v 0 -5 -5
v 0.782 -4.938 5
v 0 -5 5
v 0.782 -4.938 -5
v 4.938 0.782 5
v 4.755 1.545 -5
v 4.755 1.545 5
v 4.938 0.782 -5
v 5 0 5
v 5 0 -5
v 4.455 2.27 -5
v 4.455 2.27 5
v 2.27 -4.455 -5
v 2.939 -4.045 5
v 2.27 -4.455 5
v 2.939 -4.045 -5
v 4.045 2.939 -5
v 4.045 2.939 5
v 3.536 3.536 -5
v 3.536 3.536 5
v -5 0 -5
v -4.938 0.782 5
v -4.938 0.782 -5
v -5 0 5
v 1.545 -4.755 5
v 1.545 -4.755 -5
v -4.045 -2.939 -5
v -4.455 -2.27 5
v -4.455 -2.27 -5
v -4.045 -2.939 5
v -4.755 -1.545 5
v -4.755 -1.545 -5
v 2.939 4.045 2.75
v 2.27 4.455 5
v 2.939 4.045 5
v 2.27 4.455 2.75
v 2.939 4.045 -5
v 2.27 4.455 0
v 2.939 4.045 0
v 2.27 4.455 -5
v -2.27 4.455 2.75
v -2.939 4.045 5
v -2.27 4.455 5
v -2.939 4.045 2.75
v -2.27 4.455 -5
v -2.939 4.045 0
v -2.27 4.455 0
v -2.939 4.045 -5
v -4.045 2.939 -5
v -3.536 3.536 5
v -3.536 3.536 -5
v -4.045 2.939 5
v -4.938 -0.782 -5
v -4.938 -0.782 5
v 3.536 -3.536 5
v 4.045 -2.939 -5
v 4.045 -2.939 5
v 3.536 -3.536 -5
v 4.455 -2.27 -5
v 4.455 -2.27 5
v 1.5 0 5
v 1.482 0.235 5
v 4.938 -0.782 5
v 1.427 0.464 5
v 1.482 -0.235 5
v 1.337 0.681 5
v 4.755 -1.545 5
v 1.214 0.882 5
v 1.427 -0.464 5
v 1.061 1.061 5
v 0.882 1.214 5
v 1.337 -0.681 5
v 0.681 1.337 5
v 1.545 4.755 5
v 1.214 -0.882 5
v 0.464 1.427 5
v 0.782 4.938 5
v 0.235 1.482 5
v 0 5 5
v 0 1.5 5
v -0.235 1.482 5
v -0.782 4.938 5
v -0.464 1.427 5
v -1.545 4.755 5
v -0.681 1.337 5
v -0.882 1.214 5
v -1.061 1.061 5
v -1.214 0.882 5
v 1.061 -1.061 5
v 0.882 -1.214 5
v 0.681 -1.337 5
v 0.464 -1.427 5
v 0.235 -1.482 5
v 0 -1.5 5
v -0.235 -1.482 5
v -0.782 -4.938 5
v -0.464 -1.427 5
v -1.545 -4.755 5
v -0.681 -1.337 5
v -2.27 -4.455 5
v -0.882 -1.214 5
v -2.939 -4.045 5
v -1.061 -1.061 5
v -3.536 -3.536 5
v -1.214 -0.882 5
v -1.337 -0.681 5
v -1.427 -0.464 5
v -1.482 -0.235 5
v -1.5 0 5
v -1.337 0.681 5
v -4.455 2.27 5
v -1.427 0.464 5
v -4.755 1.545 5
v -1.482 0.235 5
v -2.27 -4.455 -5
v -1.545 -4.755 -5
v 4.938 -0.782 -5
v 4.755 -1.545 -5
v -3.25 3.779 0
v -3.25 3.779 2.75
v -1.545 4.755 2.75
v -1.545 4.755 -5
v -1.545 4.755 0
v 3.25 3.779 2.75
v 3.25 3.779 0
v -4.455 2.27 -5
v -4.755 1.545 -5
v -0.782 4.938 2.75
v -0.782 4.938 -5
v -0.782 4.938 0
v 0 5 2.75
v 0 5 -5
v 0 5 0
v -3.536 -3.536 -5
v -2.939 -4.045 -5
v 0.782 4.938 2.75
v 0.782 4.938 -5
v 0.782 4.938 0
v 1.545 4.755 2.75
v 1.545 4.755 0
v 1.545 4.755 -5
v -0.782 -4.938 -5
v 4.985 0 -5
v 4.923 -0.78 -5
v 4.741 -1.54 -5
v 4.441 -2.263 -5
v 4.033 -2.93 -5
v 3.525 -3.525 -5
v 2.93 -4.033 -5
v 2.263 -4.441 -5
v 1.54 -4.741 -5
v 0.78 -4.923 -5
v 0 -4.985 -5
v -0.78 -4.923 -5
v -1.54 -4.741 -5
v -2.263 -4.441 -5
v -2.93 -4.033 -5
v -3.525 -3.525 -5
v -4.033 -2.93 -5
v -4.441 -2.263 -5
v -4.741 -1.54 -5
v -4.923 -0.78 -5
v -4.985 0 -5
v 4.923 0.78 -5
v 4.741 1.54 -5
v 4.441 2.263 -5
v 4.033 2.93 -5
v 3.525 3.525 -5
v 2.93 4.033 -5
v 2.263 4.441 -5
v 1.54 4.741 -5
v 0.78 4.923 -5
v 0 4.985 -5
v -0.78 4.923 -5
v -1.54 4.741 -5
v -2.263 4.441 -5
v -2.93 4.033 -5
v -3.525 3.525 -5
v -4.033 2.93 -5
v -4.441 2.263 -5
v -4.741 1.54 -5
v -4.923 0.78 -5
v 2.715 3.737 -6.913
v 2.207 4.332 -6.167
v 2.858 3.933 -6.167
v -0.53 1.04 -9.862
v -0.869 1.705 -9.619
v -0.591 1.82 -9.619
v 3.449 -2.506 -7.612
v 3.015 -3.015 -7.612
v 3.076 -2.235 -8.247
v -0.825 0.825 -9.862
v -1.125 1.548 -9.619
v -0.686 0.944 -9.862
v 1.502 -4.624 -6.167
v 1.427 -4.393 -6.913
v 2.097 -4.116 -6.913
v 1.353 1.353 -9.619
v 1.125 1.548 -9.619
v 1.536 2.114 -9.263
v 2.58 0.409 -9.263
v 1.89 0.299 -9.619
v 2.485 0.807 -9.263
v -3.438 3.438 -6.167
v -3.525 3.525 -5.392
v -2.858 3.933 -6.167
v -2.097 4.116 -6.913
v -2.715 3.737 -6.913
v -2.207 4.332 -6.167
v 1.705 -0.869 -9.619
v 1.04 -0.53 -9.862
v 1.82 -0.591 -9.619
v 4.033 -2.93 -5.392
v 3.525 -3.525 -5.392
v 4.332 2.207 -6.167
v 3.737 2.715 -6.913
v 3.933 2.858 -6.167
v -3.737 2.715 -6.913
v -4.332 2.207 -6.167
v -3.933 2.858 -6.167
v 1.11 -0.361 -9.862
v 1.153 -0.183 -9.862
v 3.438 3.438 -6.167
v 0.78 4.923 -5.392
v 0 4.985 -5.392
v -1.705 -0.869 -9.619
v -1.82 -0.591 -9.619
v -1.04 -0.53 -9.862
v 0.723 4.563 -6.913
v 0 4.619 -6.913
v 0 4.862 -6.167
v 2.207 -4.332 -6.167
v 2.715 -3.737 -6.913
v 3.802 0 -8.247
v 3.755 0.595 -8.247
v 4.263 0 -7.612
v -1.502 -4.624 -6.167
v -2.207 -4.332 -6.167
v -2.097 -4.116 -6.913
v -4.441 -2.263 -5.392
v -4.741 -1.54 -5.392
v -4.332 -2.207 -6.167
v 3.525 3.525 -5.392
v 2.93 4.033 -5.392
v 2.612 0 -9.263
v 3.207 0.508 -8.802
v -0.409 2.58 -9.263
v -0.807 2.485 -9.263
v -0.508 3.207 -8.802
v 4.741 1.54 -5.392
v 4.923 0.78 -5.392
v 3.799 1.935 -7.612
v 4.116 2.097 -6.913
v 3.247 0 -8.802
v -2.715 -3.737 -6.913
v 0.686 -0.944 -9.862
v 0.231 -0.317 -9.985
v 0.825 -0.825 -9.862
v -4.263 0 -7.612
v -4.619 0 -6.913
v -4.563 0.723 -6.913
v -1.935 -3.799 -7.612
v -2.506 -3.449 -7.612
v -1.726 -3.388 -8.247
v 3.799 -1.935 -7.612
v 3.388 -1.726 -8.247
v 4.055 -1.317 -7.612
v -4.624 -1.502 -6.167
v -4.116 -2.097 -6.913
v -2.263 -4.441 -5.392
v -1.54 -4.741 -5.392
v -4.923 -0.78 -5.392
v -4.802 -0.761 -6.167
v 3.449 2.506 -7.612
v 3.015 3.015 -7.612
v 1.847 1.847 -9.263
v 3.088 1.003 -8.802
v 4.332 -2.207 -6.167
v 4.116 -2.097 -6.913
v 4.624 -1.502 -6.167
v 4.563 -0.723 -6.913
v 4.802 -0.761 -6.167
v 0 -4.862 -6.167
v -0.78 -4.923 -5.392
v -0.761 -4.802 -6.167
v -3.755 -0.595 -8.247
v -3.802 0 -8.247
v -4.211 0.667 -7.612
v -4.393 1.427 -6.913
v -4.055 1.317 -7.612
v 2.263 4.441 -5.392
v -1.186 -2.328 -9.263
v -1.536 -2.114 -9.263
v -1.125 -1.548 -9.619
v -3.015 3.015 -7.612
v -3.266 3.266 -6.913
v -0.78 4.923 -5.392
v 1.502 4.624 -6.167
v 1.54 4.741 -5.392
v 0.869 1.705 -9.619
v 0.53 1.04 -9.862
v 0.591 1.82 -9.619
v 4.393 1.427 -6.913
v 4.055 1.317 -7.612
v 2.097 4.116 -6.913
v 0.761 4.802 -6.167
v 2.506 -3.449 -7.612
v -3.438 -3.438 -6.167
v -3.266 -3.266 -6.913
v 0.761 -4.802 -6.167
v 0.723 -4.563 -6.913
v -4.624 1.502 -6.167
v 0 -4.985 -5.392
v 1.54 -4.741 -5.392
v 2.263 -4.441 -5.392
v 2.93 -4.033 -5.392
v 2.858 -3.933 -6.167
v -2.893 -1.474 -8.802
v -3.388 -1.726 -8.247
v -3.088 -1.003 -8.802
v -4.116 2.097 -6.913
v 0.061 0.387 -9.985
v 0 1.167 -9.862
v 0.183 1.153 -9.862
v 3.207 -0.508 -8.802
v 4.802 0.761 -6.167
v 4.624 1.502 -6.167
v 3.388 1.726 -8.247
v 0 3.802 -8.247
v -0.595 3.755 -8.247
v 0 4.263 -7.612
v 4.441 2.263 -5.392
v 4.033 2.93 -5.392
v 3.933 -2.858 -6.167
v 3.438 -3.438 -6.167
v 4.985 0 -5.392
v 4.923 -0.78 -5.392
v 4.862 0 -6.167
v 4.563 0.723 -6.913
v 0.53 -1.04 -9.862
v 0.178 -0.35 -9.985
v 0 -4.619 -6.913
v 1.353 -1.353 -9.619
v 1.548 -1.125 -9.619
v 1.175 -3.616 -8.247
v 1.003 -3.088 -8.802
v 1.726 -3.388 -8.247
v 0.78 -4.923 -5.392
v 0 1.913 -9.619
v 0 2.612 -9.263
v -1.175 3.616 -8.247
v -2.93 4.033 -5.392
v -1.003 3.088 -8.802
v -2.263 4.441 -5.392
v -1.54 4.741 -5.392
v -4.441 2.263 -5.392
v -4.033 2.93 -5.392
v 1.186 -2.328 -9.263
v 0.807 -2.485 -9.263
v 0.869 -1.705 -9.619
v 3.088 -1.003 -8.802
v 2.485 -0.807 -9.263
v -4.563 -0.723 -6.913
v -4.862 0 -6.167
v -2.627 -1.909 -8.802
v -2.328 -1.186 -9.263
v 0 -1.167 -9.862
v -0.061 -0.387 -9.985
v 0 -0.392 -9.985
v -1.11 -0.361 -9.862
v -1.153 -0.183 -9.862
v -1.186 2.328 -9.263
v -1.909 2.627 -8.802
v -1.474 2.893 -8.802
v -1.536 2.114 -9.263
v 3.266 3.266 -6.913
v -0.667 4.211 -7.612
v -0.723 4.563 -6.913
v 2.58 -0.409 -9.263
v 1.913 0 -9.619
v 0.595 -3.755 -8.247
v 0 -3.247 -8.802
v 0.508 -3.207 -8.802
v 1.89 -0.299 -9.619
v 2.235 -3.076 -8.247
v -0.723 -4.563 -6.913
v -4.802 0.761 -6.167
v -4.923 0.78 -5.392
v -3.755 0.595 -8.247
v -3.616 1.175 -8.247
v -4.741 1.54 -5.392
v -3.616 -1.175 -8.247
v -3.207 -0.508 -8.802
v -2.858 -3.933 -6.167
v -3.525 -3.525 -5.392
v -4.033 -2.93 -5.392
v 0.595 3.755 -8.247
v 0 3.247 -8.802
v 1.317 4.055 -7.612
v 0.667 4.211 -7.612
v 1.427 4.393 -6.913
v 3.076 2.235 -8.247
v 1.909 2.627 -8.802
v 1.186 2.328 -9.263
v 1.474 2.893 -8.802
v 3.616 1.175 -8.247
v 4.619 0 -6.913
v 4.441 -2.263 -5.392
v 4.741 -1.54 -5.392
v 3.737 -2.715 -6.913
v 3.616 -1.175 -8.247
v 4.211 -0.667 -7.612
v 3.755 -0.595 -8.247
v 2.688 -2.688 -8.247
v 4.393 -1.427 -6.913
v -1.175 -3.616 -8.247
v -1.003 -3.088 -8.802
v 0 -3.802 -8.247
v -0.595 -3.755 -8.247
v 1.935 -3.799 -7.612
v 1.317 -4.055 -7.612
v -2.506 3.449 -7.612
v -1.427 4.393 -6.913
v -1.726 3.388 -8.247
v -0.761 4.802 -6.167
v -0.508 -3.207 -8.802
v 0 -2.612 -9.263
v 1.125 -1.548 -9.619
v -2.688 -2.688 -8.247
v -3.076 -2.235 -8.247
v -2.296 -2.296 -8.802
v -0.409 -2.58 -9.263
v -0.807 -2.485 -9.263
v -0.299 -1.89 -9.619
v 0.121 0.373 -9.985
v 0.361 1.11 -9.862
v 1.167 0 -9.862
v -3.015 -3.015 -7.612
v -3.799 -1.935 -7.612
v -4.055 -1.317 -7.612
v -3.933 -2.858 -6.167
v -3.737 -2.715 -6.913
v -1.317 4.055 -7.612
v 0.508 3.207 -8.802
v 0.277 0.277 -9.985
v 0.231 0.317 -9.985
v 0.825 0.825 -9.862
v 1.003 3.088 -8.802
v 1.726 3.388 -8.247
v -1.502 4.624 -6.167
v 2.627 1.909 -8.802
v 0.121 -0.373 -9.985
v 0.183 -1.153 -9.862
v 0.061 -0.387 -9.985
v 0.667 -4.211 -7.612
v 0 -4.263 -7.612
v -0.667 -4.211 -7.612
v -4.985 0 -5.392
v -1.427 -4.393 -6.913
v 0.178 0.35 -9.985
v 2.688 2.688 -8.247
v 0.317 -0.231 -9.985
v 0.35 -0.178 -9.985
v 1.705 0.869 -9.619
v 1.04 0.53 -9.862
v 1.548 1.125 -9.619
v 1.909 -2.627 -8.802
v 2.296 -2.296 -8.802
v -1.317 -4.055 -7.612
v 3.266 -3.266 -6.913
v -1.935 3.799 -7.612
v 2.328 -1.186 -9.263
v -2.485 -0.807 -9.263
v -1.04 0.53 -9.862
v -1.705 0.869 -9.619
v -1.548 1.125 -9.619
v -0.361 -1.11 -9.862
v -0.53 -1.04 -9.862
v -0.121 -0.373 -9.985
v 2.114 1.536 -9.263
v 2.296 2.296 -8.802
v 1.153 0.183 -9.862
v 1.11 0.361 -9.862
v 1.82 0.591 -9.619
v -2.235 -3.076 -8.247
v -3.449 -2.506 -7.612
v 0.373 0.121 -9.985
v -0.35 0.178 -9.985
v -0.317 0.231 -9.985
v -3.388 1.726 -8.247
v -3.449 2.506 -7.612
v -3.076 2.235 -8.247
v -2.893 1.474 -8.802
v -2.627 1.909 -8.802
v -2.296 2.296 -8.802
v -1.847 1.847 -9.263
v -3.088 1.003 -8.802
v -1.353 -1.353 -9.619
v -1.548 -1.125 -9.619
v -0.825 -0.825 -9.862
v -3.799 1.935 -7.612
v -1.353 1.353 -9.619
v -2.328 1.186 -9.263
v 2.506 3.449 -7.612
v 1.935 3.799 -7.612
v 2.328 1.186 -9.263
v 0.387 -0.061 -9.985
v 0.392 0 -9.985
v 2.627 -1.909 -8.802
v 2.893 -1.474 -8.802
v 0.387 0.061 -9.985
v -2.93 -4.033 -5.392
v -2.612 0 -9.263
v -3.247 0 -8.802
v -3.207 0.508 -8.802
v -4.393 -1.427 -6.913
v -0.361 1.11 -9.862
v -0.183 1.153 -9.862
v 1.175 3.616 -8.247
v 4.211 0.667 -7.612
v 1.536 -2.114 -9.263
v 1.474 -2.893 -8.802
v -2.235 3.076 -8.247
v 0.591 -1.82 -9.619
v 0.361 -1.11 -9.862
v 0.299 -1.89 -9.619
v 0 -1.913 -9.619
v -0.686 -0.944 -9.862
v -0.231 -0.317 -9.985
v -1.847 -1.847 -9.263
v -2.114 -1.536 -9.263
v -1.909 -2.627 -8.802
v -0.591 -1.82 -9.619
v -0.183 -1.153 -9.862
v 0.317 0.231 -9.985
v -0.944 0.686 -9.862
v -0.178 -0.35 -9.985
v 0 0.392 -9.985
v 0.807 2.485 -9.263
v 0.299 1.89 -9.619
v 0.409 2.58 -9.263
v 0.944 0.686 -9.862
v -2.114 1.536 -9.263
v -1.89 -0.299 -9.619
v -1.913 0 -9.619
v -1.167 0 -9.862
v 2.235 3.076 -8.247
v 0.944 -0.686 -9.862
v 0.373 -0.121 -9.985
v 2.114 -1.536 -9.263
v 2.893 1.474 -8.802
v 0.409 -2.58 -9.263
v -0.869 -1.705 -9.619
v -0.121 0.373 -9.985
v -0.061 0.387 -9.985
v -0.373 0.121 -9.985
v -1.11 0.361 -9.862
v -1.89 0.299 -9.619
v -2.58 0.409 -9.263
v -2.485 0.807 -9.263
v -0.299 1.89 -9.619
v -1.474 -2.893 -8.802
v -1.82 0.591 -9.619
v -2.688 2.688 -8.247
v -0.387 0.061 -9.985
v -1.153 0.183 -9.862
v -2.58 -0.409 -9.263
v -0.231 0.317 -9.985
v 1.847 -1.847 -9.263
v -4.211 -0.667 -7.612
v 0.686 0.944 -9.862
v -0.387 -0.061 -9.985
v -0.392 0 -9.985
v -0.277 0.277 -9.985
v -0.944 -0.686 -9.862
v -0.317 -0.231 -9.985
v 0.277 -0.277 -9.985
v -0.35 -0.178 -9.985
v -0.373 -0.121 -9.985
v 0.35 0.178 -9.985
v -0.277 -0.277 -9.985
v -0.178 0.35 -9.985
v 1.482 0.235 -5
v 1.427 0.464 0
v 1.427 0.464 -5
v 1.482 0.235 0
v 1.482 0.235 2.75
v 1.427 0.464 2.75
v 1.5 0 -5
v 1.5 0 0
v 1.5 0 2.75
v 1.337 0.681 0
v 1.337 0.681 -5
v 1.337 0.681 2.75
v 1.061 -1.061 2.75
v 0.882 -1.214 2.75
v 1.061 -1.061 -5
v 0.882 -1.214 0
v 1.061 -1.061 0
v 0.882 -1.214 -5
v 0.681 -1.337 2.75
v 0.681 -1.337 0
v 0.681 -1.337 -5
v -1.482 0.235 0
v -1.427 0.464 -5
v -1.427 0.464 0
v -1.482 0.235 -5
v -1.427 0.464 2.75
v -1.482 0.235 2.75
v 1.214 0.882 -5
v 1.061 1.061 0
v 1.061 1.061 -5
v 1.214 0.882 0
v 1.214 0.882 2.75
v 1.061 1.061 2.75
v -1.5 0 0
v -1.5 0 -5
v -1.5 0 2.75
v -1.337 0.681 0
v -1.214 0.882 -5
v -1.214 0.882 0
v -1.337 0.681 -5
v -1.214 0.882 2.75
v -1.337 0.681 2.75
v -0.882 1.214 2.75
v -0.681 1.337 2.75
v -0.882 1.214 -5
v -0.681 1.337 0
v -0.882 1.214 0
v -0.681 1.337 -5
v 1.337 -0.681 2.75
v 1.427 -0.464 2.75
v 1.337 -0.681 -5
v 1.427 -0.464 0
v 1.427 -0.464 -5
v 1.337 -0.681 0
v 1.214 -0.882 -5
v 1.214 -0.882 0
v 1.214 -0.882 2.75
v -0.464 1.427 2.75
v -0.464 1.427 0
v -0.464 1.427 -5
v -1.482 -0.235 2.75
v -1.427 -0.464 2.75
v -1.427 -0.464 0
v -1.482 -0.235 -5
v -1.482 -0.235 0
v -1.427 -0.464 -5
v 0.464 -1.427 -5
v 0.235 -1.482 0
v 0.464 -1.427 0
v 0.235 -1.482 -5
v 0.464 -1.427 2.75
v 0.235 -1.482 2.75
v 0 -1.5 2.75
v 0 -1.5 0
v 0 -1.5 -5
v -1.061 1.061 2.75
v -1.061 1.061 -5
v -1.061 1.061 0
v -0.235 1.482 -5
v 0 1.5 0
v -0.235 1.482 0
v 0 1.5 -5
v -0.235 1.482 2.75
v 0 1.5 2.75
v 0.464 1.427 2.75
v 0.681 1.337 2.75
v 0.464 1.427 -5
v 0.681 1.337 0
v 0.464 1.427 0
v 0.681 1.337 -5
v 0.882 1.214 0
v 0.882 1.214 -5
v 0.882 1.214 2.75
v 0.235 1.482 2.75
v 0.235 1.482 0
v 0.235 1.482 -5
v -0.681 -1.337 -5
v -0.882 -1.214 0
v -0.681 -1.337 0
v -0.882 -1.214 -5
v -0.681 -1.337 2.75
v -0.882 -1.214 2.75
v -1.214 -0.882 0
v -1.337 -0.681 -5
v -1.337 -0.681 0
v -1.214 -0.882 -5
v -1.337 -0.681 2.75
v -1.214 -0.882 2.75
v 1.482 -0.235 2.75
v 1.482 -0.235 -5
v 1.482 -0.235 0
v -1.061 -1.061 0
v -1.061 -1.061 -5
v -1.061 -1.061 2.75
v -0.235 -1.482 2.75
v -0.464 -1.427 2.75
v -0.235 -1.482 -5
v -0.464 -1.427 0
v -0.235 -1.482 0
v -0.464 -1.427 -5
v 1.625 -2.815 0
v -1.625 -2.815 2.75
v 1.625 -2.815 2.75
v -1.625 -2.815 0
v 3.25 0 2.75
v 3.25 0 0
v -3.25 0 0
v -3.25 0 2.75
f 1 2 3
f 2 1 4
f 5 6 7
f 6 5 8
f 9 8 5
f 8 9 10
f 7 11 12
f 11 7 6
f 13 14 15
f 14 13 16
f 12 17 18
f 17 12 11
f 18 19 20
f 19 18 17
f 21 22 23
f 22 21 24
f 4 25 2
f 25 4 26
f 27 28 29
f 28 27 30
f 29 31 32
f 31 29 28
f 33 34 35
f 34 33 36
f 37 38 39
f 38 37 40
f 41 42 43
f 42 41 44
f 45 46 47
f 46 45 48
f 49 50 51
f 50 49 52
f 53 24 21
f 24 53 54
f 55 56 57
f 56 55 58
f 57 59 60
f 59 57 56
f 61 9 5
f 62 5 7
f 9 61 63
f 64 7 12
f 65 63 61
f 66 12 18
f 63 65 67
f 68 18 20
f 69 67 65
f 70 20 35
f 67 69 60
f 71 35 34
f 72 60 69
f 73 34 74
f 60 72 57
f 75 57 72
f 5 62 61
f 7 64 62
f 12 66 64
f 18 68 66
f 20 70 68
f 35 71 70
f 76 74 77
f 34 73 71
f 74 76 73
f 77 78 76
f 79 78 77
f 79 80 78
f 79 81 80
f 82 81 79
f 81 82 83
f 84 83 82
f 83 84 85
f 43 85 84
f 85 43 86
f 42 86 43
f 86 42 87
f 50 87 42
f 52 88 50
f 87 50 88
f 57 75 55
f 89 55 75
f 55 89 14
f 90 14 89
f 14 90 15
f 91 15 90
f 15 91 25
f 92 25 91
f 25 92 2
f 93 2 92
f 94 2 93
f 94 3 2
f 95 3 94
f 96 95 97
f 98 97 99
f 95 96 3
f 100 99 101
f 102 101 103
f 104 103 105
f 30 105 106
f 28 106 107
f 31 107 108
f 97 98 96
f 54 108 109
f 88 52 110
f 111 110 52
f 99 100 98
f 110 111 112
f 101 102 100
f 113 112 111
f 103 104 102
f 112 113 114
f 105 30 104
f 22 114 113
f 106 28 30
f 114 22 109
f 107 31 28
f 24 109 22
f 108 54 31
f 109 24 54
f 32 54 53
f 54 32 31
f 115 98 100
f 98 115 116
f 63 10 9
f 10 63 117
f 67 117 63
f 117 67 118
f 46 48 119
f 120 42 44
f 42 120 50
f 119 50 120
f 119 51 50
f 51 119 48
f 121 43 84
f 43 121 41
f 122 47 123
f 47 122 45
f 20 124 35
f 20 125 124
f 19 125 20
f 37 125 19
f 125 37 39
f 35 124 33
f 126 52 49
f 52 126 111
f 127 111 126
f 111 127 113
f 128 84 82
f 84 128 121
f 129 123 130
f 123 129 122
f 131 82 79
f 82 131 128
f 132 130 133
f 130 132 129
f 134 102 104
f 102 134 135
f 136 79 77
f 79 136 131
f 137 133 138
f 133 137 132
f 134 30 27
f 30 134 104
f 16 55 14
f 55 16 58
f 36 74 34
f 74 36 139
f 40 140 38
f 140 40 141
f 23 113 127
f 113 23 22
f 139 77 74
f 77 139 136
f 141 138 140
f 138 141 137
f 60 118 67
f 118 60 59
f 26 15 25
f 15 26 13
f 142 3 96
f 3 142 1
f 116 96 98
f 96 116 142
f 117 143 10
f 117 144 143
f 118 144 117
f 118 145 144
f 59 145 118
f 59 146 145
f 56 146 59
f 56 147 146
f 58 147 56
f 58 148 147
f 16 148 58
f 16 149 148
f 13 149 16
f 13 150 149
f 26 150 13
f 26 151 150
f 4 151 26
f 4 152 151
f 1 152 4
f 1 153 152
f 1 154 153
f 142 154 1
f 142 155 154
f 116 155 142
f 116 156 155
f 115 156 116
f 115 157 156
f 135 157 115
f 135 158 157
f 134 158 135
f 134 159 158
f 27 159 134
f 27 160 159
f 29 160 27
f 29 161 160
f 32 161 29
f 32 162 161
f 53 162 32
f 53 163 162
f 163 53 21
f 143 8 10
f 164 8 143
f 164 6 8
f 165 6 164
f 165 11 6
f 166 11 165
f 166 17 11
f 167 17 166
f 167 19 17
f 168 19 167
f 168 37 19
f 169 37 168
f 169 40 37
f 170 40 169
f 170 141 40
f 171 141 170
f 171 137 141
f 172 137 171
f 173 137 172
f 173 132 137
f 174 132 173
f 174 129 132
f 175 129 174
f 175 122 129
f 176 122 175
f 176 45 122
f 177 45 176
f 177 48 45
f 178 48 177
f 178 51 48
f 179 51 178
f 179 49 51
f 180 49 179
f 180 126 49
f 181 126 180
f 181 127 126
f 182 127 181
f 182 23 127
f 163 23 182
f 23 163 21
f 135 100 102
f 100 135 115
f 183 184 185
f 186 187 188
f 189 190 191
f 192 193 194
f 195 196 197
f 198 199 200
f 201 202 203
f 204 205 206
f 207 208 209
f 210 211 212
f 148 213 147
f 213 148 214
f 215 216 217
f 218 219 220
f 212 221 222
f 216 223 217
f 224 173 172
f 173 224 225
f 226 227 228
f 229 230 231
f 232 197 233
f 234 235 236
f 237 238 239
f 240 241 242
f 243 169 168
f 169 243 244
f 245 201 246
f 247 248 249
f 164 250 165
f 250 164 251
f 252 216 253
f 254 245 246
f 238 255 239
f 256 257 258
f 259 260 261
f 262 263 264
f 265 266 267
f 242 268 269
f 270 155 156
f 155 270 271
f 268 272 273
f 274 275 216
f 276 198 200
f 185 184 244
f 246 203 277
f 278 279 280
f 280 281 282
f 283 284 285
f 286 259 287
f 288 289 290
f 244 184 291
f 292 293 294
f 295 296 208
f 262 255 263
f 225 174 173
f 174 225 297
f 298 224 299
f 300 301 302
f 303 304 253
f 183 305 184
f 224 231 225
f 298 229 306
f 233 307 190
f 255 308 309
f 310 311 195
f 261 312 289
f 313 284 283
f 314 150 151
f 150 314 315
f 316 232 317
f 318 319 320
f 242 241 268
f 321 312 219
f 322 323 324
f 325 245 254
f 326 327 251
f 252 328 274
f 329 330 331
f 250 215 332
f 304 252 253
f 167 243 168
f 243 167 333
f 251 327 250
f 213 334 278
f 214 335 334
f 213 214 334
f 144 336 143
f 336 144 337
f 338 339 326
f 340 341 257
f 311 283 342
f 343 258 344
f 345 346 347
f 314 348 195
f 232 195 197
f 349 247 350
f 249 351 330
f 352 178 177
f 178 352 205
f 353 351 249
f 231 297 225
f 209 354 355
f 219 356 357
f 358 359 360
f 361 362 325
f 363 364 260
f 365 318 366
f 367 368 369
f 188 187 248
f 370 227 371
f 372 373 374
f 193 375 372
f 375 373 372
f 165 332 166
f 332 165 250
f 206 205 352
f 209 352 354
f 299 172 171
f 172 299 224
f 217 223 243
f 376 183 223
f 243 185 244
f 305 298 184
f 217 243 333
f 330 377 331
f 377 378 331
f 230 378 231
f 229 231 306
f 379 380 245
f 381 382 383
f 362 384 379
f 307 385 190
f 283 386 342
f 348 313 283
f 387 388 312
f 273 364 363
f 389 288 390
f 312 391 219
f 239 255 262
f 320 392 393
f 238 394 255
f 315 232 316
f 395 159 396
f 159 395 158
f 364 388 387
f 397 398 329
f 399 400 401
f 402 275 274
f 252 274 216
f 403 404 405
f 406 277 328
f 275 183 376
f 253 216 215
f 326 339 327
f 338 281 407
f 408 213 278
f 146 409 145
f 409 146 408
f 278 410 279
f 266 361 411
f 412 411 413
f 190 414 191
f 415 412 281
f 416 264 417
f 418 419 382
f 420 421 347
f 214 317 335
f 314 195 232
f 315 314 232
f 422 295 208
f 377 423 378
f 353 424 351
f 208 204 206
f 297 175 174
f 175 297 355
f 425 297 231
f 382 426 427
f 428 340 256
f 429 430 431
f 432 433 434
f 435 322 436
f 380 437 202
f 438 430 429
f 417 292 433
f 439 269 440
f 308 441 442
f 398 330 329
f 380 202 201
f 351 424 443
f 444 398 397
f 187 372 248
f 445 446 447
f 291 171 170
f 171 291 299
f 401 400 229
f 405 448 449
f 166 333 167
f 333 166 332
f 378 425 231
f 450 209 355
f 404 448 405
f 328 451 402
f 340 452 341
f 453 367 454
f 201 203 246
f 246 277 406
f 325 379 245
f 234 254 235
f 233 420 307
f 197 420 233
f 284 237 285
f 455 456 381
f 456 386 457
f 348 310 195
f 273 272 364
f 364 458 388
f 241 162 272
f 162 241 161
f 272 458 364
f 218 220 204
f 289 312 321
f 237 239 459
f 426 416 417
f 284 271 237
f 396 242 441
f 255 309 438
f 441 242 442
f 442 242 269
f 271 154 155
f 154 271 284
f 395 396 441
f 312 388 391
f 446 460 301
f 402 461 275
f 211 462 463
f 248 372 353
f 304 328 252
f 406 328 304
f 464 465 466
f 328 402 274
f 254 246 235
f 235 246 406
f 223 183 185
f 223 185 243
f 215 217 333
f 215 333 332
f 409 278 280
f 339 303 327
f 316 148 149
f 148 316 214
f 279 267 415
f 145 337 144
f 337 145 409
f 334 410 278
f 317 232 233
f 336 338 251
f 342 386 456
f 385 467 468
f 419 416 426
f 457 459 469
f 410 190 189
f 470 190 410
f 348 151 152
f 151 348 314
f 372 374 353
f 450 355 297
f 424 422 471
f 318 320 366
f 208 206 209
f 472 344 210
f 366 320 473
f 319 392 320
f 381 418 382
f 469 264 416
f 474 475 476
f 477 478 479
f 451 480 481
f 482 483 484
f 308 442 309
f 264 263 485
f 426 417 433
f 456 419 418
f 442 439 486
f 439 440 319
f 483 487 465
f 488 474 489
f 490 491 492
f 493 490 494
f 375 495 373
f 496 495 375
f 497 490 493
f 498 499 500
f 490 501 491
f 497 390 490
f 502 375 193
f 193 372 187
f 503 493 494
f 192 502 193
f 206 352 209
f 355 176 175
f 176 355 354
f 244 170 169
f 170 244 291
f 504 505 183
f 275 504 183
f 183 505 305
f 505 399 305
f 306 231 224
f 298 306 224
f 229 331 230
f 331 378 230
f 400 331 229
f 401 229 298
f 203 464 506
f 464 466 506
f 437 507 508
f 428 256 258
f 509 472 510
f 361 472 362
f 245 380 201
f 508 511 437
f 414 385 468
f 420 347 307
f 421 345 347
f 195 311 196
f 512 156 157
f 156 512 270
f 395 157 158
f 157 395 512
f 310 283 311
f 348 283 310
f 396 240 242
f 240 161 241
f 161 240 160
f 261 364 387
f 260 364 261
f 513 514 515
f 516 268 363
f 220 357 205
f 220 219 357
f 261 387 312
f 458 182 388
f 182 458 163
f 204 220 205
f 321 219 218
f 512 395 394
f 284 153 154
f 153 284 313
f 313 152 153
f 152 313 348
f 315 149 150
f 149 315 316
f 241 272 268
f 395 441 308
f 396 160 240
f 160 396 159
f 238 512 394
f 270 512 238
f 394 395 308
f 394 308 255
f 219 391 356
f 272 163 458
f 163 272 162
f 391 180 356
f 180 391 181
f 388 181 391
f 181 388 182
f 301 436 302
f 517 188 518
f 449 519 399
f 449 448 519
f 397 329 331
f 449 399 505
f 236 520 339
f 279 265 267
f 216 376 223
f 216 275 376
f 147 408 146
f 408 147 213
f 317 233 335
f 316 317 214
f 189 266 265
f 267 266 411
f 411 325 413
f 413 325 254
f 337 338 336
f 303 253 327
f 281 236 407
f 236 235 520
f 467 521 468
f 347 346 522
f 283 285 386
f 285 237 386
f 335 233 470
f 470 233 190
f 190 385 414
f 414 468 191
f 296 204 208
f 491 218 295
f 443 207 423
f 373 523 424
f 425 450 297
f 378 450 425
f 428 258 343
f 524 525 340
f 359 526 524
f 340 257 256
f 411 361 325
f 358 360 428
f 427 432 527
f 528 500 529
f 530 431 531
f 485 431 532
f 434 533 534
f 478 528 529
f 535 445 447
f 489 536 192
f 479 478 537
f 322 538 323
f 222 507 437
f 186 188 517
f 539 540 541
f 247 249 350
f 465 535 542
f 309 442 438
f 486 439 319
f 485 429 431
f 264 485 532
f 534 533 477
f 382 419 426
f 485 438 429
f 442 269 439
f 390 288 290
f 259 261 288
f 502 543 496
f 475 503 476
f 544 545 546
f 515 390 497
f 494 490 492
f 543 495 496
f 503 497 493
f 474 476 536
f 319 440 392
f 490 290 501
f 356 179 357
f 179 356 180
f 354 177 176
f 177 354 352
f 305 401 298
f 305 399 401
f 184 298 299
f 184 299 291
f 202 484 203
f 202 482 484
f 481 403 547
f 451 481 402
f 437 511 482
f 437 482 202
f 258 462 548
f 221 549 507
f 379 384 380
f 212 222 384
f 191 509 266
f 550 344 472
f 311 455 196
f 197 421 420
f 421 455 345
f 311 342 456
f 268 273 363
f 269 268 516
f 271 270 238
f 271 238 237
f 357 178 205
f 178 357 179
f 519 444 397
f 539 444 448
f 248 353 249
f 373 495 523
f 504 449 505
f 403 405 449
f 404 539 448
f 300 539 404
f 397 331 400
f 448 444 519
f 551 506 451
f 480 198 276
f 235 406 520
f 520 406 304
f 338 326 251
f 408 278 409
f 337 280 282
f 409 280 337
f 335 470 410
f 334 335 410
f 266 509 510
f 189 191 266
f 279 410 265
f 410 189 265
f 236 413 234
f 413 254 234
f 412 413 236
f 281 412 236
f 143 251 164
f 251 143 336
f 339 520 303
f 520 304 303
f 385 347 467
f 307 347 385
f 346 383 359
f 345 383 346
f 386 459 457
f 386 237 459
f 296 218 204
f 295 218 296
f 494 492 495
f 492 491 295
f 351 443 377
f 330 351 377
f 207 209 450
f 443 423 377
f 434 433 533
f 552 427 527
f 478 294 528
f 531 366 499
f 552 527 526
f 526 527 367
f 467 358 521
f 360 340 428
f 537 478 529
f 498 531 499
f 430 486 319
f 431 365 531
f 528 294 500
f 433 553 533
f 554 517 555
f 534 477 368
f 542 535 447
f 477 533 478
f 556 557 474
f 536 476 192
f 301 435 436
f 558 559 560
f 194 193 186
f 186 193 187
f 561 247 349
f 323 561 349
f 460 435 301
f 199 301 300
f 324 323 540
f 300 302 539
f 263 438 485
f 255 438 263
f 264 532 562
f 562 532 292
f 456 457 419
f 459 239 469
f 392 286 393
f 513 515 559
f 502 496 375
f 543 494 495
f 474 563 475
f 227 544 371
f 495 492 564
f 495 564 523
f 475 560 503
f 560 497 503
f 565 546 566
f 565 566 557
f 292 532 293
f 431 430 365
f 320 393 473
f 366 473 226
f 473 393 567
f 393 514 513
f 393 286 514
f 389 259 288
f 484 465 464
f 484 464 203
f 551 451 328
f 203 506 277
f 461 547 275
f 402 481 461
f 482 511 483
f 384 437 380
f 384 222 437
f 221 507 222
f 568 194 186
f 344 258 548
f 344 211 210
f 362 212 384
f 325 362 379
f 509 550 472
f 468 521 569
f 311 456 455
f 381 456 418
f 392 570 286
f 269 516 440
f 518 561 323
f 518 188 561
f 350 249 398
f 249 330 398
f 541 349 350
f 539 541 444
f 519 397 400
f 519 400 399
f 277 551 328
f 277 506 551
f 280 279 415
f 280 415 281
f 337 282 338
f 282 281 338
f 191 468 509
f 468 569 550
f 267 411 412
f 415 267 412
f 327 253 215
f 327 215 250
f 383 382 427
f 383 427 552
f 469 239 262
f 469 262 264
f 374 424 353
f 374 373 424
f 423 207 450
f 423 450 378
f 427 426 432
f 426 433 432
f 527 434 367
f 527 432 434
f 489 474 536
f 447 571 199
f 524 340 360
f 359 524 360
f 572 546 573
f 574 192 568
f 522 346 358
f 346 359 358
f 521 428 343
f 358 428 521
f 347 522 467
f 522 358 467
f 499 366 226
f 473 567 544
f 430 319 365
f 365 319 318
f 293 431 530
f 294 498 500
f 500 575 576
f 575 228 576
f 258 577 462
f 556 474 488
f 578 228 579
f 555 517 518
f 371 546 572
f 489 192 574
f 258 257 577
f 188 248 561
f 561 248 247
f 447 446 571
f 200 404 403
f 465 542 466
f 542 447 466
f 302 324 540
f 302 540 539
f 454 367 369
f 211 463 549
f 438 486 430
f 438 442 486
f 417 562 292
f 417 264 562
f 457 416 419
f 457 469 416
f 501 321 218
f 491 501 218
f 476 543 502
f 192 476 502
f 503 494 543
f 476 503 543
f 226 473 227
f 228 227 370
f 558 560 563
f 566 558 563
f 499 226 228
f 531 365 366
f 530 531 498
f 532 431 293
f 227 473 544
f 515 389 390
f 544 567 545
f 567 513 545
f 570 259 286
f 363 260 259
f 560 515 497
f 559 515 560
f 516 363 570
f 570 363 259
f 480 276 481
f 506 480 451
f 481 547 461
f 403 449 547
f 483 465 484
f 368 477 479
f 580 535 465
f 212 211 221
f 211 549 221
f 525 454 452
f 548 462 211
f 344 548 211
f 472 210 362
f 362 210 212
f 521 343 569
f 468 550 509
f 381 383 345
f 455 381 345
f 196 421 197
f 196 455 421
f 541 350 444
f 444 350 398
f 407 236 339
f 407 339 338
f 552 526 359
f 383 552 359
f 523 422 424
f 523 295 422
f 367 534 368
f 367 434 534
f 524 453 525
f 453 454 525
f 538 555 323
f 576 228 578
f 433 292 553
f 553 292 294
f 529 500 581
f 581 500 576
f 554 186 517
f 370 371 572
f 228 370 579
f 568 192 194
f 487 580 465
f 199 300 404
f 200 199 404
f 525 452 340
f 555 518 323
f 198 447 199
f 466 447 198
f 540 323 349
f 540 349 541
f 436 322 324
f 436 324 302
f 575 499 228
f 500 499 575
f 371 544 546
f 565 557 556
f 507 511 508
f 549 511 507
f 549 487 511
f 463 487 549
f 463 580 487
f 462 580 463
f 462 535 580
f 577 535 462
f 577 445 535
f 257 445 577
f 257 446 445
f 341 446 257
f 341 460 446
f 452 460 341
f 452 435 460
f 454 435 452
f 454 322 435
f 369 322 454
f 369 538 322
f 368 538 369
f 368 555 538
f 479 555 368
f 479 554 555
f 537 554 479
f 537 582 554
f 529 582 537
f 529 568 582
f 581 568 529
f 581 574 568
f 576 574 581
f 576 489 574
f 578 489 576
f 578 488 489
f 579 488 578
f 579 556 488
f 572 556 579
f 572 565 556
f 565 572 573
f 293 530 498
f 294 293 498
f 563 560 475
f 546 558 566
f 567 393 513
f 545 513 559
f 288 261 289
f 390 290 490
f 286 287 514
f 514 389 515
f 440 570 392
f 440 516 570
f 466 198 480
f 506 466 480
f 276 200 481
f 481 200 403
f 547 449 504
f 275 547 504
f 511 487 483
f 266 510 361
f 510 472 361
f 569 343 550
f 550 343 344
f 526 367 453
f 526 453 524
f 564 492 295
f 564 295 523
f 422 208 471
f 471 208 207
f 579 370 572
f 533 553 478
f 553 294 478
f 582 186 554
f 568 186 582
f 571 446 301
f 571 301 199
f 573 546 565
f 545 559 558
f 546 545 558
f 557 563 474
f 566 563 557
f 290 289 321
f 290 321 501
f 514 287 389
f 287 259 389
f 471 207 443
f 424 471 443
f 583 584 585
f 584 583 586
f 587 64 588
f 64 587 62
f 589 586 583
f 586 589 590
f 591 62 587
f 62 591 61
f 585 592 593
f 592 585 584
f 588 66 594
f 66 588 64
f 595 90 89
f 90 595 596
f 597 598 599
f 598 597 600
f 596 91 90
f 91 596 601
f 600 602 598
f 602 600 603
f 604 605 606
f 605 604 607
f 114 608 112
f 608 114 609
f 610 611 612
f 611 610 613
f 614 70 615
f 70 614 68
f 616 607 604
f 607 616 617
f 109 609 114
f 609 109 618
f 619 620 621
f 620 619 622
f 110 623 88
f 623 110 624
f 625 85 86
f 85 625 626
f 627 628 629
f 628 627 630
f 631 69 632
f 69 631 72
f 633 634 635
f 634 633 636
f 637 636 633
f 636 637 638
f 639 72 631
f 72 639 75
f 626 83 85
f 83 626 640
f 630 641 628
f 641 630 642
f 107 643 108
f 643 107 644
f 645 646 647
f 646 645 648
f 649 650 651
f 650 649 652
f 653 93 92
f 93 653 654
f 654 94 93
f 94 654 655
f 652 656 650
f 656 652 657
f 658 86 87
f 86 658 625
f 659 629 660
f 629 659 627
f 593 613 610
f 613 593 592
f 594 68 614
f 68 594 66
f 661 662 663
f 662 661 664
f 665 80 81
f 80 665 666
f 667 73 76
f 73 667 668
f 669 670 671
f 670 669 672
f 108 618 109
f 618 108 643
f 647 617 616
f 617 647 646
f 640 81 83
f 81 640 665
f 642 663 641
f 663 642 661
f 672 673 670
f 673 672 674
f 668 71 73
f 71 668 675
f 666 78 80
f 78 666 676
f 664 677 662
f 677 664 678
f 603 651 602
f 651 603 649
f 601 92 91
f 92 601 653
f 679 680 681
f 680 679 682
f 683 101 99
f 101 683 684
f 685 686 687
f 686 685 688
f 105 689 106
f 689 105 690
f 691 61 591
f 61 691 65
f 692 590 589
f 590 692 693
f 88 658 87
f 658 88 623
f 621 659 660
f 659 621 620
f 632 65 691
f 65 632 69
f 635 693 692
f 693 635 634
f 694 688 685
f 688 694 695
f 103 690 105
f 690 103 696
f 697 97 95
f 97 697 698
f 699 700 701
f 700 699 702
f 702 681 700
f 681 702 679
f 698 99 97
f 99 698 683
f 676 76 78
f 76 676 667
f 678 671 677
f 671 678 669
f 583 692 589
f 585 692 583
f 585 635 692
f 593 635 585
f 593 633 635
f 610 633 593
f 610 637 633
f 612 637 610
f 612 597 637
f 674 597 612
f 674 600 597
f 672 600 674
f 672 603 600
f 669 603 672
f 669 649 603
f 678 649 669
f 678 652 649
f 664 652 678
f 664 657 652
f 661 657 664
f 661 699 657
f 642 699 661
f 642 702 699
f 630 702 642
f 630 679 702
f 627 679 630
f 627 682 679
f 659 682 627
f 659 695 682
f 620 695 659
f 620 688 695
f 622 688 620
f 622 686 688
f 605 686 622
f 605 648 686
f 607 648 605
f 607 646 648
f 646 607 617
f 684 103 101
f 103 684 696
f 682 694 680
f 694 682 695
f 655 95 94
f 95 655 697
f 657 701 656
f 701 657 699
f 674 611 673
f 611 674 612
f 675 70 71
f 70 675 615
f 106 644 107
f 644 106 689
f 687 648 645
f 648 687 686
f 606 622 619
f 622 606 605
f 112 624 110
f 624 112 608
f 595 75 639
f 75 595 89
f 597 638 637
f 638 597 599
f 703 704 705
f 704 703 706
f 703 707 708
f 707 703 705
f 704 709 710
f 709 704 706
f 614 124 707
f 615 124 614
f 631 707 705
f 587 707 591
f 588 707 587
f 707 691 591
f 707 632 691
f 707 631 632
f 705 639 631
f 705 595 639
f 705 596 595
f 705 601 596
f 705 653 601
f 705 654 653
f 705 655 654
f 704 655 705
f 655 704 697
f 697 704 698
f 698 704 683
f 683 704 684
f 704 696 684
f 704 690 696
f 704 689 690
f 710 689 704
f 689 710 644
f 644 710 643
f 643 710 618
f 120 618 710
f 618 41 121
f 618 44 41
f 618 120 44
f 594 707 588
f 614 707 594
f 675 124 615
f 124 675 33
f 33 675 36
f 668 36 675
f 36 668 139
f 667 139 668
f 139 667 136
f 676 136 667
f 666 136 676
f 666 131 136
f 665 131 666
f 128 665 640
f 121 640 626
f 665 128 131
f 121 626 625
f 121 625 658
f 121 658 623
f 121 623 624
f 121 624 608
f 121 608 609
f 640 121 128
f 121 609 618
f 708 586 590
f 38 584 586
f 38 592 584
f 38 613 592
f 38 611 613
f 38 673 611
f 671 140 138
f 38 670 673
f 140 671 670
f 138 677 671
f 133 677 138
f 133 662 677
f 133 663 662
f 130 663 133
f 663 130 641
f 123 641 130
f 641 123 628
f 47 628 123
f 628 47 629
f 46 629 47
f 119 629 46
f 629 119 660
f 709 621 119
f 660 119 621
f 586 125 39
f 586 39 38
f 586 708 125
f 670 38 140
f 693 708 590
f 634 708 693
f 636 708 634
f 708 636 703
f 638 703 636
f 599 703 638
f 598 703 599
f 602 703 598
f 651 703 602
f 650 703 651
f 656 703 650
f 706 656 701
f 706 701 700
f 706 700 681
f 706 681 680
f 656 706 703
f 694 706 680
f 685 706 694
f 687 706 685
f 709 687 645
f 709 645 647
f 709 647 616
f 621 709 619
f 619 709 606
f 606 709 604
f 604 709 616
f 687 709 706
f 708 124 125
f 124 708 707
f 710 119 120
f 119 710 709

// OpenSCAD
/*
Quadrysteria QR200 landing feet  (c) by Jorge Monteiro

Quadrysteria QR200 landing feet is licensed under a
Creative Commons Attribution-ShareAlike 4.0 International.

You should have received a copy of the license along with this
work.  If not, see <http://creativecommons.org/licenses/by-sa/4.0/>.
*/
/* [Basics] */
// Set 0 to use M2.5 screw and nuts or 1 to use M3 screw and nuts
useM3nut=0;//[0:1]

/* [Ignore] */
$fn=40*1;
m25nut=5*1;
m25nuth=2*1;
m25screw=2.5*1;
m3nut=5.5*1;
m3nuth=2.4*1;
m3screw=3*1;
gap=0.5*1;

if (useM3nut==1) {
    echo("M3");
    screw=m3screw+gap;
    nut=m3nut+gap*3;
    nutHeight=m3nuth+gap*1.5;
    drawFoot(screw, nut, nutHeight);

} else {
    screw=m25screw+gap;
    nut=m25nut+gap*3;
    nutHeight=m25nuth+gap*1.5;
    
    drawFoot(screw, nut, nutHeight);
}

module drawFoot(screw, nut, nutHeight) {
    difference() {
        translate([0,0,-5])
        difference() {
            union(){
                cylinder(10, 5, 5);
                sphere(r=5);
            }
            cylinder(10, screw/2, screw/2);
        }
        // draw the nut hole
        cylinder(nutHeight, nut/2, nut/2, $fn=6);
        // and the openning to insert the nut
        translate([-nut/2,0,0]) cube([nut,nut,nutHeight]);
        
    }
};
